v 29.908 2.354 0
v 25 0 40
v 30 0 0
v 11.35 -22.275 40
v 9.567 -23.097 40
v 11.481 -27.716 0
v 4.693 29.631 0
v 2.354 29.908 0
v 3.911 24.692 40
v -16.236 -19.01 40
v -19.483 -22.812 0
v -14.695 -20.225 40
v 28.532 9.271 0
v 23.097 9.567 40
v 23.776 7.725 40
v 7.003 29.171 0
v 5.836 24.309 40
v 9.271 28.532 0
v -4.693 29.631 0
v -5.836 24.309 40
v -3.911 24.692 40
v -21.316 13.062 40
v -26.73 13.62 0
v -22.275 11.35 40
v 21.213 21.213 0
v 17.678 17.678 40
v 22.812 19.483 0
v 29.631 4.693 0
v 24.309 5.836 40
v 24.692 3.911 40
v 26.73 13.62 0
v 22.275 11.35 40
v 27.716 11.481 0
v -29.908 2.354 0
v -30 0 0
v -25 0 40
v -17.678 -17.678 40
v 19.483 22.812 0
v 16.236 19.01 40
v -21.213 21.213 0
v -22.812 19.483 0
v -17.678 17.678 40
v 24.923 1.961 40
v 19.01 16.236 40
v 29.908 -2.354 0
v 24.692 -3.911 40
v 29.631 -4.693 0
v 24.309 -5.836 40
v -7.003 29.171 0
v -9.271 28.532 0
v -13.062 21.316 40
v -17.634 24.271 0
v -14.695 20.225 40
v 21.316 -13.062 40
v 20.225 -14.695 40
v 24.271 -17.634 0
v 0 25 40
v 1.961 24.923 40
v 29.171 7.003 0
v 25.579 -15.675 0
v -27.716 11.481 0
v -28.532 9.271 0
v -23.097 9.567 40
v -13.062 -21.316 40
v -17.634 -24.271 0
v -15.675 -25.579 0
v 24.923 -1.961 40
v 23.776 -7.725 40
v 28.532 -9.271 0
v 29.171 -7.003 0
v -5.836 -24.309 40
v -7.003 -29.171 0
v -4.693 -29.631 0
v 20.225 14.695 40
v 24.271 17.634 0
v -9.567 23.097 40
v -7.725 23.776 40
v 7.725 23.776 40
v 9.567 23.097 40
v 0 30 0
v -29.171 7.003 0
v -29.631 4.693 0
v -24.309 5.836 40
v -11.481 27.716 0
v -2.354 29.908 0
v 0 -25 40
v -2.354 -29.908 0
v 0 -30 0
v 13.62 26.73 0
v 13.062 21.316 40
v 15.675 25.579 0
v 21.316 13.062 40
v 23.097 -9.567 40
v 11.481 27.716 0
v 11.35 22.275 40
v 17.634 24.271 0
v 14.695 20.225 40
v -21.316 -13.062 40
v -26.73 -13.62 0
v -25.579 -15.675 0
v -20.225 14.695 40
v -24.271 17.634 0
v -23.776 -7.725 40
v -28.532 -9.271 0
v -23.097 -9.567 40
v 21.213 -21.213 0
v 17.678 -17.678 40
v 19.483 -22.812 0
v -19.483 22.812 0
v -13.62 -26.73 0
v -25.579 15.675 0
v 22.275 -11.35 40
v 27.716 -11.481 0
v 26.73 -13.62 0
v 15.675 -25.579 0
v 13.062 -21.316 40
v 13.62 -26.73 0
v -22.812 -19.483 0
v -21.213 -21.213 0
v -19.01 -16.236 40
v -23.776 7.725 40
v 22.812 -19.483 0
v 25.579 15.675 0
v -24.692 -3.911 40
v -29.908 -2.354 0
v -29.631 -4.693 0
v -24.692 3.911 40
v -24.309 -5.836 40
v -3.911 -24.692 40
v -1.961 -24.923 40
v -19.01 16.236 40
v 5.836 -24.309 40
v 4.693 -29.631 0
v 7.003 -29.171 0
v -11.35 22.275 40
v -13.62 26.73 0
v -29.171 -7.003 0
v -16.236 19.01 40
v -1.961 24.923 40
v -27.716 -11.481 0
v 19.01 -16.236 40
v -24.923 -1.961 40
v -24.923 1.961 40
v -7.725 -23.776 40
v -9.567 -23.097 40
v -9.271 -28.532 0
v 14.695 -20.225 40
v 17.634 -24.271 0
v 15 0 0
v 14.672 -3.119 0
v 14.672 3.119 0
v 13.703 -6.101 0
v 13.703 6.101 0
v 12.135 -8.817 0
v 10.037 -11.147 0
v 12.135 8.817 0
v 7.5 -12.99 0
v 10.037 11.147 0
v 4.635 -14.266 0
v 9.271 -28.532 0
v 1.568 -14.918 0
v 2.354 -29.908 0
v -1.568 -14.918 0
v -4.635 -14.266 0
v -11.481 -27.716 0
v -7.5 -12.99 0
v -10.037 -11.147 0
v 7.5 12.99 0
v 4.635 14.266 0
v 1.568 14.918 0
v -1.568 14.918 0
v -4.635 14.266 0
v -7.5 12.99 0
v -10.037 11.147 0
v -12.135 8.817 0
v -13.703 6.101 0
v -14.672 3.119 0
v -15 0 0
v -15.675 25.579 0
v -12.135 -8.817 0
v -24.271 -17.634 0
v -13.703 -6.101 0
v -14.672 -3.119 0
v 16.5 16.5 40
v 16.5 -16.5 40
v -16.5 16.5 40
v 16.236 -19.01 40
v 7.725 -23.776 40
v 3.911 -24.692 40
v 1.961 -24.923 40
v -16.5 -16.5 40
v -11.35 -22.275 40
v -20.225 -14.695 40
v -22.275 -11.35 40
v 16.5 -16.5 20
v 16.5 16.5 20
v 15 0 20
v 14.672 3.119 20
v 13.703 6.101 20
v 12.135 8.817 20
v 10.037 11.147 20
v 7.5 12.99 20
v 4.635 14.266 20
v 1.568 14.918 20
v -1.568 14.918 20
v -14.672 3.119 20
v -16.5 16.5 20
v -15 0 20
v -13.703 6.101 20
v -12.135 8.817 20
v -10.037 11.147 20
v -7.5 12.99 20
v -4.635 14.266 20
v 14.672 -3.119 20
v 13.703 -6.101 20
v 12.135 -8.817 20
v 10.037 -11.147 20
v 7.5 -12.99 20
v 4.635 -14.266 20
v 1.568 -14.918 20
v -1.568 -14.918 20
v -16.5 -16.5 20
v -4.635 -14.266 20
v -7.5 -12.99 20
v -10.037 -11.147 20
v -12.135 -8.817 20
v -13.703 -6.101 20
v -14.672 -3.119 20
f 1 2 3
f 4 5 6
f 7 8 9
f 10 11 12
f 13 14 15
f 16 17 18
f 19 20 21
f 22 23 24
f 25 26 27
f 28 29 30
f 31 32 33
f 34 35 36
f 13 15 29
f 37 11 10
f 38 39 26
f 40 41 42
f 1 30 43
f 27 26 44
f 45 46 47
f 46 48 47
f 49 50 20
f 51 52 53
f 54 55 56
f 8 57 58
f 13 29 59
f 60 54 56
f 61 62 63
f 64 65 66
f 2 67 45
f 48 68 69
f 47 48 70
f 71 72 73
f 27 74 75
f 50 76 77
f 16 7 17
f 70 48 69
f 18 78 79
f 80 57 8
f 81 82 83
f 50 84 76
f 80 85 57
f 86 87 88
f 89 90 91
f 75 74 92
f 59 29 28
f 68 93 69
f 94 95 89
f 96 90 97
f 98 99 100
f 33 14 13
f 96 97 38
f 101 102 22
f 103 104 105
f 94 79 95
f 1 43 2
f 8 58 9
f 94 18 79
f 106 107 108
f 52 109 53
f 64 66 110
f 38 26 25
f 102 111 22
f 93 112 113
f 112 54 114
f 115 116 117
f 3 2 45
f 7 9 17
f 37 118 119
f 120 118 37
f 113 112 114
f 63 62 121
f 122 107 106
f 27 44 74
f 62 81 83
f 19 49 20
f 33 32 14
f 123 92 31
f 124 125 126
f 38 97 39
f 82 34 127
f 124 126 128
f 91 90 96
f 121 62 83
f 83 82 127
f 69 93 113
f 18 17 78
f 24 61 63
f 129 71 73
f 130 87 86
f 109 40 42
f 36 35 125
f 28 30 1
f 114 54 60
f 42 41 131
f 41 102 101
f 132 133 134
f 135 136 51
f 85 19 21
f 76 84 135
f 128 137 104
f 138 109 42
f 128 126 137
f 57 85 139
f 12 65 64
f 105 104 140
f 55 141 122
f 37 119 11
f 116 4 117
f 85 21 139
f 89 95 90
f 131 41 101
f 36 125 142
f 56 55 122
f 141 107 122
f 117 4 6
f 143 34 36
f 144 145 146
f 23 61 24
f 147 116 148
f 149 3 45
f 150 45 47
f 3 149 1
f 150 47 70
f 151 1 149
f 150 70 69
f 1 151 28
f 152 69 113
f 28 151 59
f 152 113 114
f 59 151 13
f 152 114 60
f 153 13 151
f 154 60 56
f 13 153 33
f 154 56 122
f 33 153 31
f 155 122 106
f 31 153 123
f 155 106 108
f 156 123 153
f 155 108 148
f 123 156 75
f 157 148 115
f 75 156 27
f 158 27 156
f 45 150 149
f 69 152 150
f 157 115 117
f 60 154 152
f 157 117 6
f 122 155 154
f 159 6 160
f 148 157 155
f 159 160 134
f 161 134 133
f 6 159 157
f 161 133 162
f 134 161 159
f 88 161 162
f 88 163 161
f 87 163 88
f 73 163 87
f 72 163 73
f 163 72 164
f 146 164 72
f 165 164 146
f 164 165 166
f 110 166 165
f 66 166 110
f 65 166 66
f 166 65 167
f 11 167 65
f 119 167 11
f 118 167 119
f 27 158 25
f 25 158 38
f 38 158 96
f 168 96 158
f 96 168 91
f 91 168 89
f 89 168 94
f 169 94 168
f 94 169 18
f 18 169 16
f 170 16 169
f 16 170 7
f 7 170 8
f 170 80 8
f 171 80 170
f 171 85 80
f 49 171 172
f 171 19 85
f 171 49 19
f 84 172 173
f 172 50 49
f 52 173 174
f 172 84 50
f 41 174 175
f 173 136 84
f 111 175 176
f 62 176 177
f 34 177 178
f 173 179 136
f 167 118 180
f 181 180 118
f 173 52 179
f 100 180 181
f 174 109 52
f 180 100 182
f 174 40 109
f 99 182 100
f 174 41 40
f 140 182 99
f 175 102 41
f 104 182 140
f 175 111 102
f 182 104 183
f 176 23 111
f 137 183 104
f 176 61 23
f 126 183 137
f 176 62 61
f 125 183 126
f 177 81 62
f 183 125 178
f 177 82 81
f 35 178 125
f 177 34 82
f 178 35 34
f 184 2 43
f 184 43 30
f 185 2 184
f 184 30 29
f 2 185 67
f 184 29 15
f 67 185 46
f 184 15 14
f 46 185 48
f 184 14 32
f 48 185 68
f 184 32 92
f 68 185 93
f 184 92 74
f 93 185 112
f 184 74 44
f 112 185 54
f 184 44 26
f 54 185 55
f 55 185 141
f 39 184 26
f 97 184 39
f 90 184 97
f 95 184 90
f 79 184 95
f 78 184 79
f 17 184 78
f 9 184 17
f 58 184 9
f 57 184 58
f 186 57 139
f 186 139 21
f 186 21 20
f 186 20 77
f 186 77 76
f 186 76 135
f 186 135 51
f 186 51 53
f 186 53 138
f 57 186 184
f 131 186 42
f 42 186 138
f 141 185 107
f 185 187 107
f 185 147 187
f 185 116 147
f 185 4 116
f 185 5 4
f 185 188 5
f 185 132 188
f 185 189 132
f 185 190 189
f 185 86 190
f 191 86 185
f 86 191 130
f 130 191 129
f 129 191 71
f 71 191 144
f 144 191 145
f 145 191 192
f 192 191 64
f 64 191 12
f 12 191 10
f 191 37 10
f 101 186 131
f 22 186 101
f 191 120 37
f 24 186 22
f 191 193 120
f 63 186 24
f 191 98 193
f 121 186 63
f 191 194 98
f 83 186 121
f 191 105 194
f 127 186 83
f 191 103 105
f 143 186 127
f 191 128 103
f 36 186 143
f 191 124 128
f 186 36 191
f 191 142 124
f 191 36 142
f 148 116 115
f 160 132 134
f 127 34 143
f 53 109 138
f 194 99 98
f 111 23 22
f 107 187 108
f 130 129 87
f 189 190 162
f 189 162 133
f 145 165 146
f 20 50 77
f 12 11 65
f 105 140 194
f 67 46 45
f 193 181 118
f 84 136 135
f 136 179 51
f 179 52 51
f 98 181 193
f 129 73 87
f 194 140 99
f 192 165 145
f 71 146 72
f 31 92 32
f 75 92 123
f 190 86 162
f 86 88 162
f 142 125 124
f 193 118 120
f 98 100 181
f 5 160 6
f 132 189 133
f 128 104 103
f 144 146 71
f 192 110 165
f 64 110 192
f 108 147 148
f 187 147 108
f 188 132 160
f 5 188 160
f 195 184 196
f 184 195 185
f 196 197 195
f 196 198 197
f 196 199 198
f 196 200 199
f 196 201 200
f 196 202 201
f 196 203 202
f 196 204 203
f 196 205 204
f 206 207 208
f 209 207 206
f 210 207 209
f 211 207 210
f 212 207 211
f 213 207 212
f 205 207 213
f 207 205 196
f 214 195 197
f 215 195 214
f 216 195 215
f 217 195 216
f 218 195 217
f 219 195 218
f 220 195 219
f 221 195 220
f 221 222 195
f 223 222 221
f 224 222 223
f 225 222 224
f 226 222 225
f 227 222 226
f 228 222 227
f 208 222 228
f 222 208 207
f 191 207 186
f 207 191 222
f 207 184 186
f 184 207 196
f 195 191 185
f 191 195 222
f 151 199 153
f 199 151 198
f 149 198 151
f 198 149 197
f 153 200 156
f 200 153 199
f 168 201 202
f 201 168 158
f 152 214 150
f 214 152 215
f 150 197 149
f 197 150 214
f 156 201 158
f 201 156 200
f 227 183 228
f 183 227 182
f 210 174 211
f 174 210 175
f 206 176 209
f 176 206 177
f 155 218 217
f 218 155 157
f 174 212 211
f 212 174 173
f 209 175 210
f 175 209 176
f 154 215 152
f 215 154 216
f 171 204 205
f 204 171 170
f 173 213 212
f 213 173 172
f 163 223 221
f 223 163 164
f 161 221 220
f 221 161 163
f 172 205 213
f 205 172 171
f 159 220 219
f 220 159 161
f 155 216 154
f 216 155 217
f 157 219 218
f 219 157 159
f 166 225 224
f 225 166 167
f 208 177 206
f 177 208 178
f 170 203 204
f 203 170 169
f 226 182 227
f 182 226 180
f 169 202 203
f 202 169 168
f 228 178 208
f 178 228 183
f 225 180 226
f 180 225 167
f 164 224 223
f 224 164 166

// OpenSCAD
a();
module a(){
	difference(){
	cylinder(r=30,r2=25,h=40,center=false,$fn=80);
	translate([-33/2,-33/2,20])
	cube([33,33,1600]);
	translate([0,0,-1])cylinder(r=15,h=40,center=false);
	}

}
